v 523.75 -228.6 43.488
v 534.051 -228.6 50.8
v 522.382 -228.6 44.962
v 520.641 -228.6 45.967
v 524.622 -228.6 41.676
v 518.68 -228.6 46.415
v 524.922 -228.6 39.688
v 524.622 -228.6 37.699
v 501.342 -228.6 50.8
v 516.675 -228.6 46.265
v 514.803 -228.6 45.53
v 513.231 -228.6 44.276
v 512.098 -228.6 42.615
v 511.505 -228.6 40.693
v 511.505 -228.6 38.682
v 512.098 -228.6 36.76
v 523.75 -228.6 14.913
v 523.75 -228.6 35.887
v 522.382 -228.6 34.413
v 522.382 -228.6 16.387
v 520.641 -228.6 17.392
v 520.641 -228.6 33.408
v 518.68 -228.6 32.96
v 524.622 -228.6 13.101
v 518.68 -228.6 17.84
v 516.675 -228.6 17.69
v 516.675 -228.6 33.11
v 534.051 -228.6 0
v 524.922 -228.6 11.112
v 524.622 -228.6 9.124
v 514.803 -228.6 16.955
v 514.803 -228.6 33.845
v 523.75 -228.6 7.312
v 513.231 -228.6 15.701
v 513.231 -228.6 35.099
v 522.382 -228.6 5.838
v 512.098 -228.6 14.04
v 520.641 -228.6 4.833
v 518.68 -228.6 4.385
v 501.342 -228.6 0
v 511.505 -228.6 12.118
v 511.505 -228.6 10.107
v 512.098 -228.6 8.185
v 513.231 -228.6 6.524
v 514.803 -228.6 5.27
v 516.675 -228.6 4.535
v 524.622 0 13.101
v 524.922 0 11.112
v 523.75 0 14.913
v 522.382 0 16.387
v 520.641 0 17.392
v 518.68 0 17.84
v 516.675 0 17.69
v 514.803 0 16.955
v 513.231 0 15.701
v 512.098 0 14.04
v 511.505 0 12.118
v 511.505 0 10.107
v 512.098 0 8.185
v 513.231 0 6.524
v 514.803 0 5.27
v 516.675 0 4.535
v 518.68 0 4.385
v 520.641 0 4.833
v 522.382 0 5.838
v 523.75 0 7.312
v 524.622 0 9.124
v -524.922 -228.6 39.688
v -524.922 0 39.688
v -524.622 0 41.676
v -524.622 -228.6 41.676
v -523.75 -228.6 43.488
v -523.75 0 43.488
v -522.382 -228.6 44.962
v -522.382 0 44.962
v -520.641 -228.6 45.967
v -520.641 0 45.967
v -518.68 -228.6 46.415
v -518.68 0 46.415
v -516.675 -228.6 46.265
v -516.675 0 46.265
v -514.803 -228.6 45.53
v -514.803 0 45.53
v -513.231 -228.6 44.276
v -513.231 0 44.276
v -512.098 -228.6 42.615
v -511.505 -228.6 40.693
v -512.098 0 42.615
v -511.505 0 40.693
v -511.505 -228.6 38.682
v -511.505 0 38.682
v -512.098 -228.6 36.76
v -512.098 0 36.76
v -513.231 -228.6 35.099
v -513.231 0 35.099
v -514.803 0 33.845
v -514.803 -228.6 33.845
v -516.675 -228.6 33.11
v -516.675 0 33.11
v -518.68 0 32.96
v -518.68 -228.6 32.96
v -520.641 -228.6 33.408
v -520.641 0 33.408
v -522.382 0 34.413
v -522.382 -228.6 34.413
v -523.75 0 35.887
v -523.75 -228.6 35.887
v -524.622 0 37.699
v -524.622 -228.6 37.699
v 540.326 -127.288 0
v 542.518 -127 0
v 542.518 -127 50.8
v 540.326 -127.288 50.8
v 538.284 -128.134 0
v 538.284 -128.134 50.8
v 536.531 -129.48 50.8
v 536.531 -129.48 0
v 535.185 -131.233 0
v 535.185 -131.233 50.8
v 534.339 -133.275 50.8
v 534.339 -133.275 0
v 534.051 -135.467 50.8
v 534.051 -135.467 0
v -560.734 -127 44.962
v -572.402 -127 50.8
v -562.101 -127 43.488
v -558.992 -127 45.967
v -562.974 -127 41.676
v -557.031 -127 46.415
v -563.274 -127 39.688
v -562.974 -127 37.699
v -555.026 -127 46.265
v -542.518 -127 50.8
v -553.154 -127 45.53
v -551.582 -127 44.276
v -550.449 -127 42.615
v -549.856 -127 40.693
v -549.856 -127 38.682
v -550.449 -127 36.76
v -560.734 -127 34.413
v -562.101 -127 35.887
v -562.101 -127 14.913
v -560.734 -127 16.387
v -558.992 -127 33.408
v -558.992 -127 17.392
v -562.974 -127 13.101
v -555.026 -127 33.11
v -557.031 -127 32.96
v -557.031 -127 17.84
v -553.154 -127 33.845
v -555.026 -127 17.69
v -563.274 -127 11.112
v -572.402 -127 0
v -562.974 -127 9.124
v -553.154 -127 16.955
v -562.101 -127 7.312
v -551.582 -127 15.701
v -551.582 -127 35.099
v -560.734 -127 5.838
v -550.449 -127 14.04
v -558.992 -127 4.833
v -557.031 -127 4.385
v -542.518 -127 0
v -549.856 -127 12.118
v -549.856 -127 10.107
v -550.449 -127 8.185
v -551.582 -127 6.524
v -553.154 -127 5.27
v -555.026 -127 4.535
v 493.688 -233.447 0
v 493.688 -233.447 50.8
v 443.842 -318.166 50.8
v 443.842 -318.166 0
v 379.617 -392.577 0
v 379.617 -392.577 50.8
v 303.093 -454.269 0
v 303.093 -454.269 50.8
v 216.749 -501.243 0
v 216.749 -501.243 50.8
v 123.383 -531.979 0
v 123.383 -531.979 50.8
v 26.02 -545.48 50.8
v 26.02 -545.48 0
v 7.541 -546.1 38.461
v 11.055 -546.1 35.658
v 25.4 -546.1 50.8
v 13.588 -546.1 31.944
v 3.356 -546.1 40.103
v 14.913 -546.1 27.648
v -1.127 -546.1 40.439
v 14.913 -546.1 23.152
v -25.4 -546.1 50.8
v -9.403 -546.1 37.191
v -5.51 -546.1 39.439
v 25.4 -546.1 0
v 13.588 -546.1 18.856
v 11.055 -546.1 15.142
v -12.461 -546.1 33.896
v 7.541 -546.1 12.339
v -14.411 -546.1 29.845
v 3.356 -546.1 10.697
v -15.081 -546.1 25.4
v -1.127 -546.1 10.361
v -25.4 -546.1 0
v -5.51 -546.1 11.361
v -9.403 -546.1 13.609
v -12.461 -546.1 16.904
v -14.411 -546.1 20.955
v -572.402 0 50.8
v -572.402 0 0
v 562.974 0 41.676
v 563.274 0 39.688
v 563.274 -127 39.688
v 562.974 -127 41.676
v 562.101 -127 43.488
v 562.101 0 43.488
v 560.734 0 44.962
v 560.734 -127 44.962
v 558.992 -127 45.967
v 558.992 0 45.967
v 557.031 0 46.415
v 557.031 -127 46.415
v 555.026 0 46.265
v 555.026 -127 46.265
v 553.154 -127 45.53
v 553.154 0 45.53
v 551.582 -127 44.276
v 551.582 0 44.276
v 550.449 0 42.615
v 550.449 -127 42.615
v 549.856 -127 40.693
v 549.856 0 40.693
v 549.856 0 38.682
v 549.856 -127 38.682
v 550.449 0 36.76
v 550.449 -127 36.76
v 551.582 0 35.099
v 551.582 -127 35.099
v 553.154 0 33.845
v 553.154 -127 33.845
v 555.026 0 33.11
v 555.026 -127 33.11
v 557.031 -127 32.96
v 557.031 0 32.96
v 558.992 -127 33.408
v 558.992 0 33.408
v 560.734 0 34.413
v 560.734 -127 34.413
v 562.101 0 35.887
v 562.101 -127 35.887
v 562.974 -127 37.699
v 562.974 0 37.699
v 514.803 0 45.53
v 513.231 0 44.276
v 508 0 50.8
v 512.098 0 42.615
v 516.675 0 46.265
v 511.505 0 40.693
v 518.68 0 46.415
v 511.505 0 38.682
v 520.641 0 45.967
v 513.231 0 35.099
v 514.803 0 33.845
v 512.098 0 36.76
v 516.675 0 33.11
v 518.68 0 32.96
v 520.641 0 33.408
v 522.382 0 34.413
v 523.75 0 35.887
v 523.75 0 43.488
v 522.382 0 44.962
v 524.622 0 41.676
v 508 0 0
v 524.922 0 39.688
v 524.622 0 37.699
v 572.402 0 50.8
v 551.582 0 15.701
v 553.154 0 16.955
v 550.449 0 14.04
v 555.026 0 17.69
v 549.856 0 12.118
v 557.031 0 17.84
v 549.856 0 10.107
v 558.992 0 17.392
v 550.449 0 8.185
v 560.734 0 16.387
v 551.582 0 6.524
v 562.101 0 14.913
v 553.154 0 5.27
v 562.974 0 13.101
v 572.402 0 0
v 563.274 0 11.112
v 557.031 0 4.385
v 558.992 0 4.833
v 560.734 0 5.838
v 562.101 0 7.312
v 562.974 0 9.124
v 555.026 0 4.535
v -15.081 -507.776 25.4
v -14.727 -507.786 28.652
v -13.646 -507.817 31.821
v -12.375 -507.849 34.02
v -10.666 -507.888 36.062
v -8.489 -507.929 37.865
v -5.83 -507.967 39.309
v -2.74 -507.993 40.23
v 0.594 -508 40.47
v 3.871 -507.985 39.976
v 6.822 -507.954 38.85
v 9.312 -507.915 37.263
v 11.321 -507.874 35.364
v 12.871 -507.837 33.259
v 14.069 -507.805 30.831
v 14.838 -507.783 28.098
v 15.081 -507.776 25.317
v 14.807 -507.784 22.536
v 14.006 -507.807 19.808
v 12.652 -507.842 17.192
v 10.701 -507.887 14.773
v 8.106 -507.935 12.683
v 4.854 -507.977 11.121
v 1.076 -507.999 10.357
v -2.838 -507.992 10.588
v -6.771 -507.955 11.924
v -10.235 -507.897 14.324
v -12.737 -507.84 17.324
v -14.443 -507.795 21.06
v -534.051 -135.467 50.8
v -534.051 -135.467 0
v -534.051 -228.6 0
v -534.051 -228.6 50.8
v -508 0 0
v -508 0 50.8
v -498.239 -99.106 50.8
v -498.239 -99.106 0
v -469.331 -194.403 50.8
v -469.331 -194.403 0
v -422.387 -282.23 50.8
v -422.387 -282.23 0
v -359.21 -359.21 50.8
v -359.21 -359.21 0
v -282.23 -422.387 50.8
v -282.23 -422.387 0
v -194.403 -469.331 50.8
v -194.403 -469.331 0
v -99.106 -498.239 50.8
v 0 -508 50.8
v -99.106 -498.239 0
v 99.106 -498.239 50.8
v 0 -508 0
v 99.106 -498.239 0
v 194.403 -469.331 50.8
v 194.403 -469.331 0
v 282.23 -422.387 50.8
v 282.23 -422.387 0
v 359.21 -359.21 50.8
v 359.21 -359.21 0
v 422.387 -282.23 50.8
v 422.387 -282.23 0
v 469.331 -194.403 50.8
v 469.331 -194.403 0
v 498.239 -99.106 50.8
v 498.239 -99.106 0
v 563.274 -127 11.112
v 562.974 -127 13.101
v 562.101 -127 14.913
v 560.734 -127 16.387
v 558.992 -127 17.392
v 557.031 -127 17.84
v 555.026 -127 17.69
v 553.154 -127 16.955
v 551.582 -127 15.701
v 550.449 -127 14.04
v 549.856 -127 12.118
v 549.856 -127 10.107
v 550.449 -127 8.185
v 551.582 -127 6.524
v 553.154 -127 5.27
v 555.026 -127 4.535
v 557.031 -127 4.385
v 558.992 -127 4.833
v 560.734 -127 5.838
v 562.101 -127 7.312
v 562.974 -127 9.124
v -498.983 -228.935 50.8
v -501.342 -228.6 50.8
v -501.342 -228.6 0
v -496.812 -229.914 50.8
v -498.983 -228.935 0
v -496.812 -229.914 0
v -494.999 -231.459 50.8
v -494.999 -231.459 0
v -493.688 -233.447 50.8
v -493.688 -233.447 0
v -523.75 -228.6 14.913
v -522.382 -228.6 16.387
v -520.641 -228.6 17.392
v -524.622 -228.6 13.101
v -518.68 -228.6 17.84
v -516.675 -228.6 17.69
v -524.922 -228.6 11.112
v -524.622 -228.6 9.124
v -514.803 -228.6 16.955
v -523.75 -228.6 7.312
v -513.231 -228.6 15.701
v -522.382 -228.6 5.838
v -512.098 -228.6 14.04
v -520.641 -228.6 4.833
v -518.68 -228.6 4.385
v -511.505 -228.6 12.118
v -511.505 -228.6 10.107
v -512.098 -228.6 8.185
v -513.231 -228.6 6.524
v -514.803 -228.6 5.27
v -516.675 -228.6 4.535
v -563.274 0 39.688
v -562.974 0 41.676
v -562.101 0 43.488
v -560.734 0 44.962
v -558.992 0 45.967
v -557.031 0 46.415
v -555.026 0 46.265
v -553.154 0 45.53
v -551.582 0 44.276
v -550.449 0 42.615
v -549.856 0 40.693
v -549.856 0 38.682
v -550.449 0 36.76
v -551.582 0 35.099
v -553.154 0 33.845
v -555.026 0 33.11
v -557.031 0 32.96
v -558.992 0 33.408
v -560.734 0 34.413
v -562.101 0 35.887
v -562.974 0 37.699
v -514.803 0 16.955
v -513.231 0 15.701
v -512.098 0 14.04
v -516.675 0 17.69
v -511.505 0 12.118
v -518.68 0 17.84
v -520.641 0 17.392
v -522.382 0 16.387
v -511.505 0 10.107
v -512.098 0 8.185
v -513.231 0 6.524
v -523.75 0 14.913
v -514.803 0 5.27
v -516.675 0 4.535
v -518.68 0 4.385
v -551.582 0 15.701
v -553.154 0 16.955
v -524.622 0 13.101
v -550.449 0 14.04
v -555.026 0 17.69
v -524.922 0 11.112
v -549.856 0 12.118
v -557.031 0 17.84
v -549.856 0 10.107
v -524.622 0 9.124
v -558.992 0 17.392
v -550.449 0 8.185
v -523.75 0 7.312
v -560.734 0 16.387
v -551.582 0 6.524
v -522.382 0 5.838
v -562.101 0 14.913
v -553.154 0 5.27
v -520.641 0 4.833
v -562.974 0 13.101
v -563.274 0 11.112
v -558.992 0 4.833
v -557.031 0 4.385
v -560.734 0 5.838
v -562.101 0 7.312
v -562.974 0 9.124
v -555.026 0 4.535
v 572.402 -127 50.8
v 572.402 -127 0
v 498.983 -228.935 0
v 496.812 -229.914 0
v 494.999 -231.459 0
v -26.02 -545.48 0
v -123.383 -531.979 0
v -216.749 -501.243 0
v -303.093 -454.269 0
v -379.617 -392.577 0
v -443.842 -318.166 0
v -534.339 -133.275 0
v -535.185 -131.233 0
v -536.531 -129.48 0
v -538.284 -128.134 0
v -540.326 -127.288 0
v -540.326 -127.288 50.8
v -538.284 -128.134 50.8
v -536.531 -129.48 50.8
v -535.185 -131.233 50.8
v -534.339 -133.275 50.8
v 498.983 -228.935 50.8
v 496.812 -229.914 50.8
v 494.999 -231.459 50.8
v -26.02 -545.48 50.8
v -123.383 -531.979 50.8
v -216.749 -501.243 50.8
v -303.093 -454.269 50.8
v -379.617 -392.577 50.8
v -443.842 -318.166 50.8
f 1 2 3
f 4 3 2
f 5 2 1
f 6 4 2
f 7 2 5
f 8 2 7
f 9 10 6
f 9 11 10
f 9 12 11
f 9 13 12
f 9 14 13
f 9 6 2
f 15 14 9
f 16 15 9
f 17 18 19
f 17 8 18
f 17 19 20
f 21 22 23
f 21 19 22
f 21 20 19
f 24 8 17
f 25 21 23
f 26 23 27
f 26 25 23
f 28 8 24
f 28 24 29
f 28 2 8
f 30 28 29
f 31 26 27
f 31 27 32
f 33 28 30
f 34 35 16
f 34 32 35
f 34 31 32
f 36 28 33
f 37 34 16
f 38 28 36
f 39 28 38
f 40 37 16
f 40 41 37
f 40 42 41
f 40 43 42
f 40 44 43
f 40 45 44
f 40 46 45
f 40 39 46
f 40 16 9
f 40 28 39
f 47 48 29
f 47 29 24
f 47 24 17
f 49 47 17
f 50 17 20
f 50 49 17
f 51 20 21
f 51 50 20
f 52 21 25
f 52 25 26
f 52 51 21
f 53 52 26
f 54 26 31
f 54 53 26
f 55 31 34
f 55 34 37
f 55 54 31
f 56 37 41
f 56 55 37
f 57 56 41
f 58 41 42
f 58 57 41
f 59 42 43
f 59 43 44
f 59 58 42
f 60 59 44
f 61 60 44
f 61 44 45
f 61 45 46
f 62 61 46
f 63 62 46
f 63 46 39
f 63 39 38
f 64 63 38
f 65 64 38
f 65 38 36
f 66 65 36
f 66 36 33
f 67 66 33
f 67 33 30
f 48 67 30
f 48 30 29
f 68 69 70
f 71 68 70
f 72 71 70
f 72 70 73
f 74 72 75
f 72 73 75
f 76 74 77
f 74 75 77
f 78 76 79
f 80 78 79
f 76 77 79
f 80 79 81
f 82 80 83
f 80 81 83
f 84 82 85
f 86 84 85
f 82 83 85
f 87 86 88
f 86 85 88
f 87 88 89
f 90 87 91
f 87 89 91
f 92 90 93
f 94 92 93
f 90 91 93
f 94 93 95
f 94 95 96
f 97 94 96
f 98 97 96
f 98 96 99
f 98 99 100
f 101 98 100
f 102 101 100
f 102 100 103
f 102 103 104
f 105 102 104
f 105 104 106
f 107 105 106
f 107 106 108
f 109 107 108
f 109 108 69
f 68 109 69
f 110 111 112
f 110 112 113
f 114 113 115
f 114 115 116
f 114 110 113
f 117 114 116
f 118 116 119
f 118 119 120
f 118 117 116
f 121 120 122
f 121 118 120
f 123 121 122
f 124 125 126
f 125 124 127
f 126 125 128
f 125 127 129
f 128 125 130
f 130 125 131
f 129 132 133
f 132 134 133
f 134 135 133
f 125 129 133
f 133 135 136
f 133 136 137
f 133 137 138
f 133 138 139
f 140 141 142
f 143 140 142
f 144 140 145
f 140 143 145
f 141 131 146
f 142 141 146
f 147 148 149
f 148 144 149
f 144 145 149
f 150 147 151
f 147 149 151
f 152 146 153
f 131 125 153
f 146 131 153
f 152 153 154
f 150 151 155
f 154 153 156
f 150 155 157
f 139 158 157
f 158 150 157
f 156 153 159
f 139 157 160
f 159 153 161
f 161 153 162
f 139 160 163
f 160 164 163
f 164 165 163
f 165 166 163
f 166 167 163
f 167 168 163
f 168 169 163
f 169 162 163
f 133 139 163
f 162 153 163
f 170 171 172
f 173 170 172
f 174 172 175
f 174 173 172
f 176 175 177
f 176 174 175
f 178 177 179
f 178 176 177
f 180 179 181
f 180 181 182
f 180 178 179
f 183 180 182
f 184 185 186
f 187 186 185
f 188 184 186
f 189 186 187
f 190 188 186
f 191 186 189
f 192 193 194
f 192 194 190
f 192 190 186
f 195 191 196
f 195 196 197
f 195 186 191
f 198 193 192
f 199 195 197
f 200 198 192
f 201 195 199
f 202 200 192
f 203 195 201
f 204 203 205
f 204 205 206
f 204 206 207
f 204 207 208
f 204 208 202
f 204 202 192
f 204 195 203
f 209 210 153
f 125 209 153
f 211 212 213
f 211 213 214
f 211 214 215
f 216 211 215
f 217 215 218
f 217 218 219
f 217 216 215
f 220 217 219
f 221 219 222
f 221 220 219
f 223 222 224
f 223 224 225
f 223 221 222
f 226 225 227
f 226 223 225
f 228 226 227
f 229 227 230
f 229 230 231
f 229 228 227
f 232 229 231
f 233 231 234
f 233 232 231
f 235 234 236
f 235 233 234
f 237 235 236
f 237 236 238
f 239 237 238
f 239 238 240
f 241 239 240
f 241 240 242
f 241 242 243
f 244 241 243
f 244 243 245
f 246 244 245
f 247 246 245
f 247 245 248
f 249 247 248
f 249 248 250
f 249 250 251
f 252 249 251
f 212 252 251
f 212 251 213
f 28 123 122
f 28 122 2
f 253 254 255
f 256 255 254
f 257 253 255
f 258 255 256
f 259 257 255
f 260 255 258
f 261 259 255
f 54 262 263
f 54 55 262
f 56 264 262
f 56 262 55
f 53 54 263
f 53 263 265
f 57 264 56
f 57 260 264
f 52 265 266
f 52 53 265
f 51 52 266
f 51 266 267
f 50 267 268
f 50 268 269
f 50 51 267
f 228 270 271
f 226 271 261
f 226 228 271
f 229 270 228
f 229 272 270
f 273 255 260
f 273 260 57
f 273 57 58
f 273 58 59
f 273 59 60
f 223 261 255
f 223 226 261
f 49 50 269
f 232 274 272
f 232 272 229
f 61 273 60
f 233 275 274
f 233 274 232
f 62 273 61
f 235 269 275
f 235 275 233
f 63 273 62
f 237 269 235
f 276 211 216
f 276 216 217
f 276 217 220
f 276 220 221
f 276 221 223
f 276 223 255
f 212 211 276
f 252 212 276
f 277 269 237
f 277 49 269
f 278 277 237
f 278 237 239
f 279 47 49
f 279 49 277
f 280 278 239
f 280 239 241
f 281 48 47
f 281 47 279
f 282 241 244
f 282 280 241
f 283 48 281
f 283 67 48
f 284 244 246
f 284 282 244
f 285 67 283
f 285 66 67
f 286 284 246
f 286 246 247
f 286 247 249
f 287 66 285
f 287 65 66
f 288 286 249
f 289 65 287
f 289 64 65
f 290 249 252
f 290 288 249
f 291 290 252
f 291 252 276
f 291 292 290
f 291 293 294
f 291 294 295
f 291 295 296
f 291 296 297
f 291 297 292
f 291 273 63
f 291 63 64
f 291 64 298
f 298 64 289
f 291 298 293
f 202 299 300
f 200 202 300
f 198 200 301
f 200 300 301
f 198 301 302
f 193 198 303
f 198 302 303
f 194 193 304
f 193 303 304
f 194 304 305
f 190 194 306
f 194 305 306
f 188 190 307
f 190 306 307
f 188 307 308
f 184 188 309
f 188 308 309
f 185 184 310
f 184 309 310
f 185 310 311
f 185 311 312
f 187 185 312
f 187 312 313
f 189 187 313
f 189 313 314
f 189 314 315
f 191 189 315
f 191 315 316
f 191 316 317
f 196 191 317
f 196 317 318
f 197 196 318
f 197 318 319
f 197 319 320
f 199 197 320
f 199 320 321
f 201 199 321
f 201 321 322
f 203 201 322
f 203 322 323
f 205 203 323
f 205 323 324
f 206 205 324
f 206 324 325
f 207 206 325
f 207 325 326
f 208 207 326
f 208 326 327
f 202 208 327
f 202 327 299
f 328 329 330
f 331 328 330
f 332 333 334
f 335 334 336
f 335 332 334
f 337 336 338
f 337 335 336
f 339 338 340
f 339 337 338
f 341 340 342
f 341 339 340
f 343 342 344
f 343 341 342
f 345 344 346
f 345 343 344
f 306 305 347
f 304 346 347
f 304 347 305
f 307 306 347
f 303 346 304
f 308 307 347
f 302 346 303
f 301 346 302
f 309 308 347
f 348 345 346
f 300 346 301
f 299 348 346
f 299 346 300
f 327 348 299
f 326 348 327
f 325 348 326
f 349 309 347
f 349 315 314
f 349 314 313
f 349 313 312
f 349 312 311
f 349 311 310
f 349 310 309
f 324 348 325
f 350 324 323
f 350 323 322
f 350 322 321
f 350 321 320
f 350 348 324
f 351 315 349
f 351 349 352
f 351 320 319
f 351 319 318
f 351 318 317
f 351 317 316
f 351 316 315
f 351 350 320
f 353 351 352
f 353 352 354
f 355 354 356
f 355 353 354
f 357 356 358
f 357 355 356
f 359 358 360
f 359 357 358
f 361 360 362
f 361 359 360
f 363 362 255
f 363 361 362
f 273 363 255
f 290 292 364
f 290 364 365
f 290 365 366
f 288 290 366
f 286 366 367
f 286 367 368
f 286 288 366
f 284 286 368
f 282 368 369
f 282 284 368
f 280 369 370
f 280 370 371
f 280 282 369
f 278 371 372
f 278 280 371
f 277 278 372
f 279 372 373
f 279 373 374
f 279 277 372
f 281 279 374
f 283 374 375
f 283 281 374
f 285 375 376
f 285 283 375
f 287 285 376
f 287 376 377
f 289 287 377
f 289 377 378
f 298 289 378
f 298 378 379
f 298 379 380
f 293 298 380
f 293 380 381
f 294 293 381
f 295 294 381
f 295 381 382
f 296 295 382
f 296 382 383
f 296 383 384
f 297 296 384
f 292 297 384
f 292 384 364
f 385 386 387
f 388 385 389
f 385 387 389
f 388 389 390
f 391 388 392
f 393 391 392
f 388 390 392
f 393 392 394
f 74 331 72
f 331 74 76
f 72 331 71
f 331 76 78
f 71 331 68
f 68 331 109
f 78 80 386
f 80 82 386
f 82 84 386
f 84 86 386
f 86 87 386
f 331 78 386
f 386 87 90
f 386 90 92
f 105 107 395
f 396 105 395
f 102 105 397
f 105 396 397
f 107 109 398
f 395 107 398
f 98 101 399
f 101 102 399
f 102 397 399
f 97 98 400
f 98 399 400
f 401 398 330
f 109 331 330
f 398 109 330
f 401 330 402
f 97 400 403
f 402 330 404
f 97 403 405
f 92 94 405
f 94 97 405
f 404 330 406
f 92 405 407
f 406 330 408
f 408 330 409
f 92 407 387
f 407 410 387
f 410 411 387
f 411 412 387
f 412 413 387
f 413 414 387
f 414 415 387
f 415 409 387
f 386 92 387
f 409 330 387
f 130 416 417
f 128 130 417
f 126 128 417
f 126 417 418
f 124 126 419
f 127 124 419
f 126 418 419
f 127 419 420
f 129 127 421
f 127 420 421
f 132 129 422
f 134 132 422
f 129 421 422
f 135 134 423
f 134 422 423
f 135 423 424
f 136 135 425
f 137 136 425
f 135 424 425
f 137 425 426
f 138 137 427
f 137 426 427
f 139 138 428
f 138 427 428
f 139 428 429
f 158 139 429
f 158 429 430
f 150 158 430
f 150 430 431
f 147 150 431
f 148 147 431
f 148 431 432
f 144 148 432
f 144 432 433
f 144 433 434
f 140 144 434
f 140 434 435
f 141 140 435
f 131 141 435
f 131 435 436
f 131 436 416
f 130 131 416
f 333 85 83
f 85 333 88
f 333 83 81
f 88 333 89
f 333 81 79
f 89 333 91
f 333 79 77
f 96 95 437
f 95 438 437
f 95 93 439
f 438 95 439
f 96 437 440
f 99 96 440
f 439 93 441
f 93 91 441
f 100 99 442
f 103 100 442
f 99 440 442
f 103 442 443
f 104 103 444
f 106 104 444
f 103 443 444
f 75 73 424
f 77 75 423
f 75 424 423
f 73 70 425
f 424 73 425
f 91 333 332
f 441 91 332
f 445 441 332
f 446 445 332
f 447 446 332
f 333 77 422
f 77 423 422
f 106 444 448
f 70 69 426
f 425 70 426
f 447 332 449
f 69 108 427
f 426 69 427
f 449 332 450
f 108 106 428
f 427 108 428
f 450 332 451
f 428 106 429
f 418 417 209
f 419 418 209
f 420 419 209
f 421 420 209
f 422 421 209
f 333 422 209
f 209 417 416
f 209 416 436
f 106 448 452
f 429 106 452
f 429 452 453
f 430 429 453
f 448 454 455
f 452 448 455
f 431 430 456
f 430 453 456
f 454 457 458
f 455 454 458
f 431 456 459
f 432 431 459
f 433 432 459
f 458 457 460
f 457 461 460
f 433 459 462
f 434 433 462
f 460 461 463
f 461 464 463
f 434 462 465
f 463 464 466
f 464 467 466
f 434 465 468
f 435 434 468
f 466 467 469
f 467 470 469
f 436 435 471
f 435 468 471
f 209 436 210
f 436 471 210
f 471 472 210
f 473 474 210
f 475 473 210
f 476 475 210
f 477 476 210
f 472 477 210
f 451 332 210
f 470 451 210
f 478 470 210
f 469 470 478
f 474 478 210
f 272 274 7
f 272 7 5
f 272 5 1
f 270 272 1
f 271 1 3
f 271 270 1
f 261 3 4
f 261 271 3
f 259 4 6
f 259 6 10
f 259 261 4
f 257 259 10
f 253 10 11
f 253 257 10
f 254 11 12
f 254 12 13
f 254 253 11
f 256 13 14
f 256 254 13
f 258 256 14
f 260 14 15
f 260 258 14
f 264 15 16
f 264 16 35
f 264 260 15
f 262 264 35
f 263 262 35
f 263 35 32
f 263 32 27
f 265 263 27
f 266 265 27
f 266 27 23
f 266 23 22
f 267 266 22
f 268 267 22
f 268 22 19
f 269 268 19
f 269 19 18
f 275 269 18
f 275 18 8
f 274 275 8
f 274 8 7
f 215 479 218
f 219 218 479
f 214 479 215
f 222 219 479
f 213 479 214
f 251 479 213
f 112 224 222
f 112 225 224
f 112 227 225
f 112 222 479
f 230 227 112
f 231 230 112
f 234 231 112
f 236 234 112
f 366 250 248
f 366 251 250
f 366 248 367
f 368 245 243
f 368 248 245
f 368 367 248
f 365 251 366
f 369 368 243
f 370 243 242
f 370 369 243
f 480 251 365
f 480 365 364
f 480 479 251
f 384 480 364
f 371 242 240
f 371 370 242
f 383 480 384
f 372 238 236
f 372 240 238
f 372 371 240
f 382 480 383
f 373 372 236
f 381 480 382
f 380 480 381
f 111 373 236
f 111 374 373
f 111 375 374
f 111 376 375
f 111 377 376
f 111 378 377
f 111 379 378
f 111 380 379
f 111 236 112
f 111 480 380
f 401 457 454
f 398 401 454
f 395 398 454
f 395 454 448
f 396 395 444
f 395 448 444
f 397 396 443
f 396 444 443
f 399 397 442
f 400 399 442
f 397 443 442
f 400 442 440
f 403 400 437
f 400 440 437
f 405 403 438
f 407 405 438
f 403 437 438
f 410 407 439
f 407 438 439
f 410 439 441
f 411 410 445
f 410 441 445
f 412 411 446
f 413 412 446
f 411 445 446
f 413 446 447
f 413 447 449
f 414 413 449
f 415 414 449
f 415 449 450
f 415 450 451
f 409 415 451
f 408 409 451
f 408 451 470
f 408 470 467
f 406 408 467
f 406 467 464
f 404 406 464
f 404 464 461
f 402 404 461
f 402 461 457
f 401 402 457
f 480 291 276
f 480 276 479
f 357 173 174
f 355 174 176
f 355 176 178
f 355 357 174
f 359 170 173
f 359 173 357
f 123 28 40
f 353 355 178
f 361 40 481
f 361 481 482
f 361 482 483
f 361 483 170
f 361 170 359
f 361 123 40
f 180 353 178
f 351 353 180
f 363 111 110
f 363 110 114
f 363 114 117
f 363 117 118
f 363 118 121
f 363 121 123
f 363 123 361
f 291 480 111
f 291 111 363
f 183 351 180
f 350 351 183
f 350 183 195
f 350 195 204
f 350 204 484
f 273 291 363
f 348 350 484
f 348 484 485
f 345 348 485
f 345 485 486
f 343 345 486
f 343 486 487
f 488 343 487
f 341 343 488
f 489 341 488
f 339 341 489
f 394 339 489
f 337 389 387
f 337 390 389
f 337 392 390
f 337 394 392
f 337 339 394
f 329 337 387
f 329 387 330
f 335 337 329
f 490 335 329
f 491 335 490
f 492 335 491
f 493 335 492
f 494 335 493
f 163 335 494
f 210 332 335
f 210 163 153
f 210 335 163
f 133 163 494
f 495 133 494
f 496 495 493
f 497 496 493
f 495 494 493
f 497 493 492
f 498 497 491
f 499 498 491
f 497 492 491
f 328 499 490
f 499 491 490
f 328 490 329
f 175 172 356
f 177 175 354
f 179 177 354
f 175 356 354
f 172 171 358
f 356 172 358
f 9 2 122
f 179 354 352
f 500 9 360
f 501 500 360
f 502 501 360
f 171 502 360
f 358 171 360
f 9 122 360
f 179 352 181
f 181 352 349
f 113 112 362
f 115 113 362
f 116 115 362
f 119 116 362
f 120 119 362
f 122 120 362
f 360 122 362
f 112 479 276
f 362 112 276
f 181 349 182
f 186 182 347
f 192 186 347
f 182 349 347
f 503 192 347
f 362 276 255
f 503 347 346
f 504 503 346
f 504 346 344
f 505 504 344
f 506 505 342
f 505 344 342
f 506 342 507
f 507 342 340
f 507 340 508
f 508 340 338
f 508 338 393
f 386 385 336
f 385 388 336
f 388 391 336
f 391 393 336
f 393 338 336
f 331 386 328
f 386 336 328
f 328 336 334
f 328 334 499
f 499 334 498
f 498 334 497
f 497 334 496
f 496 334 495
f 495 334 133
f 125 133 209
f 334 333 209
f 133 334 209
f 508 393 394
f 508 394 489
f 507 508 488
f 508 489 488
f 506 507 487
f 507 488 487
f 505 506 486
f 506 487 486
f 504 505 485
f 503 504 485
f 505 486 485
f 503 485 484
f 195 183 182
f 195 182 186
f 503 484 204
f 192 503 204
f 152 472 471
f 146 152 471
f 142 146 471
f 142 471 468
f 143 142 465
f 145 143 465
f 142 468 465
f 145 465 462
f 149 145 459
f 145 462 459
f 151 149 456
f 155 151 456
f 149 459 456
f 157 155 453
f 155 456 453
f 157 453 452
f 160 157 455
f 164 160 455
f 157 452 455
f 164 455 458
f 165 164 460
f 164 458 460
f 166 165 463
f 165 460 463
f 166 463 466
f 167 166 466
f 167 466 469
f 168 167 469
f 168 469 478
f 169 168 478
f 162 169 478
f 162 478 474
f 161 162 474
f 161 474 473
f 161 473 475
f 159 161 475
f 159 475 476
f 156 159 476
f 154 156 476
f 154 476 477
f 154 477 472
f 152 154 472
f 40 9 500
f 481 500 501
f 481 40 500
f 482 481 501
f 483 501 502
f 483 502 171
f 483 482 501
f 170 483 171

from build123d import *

# Parameters (mm, degrees)
F1_DEPTH = 50.8
F4_D     = 13.49248
F5_D     = 13.49248
F8_D     = 30.1625


with BuildPart() as f1:
    # F0 (on Top) → F1 (new body)
    with BuildSketch(Plane.XY):
        with BuildLine():
            ThreePointArc((0, -508), (-359.2102448428, -359.2102448428), (-508, 0))
            Line((-508, 0), (-546.1, 0))
            Line((-546.1, 0), (-572.4023011247, 0))
            Line((-572.4023011247, 0), (-572.4023011247, -127))
            Line((-572.4023011247, -127), (-542.5175210867, -127))
            ThreePointArc((-542.5175210867, -127), (-536.5306836727, -129.4798292526), (-534.0508544201, -135.4666666667))
            Line((-534.0508544201, -135.4666666667), (-534.0508544201, -228.6))
            Line((-534.0508544201, -228.6), (-501.3417829518, -228.6))
            ThreePointArc((-501.3417829518, -228.6), (-496.8118429706, -229.9137589914), (-493.6877099297, -233.4473282443))
            ThreePointArc((-493.6877099297, -233.4473282443), (-303.0926410641, -454.2687100525), (-26.02025103, -545.47974897))
            Line((-26.02025103, -545.47974897), (-25.4, -546.1))
            Line((-25.4, -546.1), (0, -546.1))
            Line((0, -546.1), (0, -508))
        make_face()
    extrude(amount=F1_DEPTH)

    # F4 (through all)
    with Locations(Plane.XZ.offset(127)):
        with Locations((-556.5273011247, 11.1125), (-556.5273011247, 39.6875)):
            Hole(F4_D / 2)

    # F5 (through all)
    with Locations(Plane.XZ.offset(228.6)):
        with Locations((-518.1758544201, 39.6875), (-518.1758544201, 11.1125)):
            Hole(F5_D / 2)

    # F6: F1 across plane


with BuildPart() as f1_1:
    add(f1.part)
    add(f1.part.mirror(Plane.YZ))

    # F8 (through all)
    with Locations(Plane.XZ.offset(546.1)):
        with Locations((0, 25.4)):
            Hole(F8_D / 2)


solid = f1_1.part
